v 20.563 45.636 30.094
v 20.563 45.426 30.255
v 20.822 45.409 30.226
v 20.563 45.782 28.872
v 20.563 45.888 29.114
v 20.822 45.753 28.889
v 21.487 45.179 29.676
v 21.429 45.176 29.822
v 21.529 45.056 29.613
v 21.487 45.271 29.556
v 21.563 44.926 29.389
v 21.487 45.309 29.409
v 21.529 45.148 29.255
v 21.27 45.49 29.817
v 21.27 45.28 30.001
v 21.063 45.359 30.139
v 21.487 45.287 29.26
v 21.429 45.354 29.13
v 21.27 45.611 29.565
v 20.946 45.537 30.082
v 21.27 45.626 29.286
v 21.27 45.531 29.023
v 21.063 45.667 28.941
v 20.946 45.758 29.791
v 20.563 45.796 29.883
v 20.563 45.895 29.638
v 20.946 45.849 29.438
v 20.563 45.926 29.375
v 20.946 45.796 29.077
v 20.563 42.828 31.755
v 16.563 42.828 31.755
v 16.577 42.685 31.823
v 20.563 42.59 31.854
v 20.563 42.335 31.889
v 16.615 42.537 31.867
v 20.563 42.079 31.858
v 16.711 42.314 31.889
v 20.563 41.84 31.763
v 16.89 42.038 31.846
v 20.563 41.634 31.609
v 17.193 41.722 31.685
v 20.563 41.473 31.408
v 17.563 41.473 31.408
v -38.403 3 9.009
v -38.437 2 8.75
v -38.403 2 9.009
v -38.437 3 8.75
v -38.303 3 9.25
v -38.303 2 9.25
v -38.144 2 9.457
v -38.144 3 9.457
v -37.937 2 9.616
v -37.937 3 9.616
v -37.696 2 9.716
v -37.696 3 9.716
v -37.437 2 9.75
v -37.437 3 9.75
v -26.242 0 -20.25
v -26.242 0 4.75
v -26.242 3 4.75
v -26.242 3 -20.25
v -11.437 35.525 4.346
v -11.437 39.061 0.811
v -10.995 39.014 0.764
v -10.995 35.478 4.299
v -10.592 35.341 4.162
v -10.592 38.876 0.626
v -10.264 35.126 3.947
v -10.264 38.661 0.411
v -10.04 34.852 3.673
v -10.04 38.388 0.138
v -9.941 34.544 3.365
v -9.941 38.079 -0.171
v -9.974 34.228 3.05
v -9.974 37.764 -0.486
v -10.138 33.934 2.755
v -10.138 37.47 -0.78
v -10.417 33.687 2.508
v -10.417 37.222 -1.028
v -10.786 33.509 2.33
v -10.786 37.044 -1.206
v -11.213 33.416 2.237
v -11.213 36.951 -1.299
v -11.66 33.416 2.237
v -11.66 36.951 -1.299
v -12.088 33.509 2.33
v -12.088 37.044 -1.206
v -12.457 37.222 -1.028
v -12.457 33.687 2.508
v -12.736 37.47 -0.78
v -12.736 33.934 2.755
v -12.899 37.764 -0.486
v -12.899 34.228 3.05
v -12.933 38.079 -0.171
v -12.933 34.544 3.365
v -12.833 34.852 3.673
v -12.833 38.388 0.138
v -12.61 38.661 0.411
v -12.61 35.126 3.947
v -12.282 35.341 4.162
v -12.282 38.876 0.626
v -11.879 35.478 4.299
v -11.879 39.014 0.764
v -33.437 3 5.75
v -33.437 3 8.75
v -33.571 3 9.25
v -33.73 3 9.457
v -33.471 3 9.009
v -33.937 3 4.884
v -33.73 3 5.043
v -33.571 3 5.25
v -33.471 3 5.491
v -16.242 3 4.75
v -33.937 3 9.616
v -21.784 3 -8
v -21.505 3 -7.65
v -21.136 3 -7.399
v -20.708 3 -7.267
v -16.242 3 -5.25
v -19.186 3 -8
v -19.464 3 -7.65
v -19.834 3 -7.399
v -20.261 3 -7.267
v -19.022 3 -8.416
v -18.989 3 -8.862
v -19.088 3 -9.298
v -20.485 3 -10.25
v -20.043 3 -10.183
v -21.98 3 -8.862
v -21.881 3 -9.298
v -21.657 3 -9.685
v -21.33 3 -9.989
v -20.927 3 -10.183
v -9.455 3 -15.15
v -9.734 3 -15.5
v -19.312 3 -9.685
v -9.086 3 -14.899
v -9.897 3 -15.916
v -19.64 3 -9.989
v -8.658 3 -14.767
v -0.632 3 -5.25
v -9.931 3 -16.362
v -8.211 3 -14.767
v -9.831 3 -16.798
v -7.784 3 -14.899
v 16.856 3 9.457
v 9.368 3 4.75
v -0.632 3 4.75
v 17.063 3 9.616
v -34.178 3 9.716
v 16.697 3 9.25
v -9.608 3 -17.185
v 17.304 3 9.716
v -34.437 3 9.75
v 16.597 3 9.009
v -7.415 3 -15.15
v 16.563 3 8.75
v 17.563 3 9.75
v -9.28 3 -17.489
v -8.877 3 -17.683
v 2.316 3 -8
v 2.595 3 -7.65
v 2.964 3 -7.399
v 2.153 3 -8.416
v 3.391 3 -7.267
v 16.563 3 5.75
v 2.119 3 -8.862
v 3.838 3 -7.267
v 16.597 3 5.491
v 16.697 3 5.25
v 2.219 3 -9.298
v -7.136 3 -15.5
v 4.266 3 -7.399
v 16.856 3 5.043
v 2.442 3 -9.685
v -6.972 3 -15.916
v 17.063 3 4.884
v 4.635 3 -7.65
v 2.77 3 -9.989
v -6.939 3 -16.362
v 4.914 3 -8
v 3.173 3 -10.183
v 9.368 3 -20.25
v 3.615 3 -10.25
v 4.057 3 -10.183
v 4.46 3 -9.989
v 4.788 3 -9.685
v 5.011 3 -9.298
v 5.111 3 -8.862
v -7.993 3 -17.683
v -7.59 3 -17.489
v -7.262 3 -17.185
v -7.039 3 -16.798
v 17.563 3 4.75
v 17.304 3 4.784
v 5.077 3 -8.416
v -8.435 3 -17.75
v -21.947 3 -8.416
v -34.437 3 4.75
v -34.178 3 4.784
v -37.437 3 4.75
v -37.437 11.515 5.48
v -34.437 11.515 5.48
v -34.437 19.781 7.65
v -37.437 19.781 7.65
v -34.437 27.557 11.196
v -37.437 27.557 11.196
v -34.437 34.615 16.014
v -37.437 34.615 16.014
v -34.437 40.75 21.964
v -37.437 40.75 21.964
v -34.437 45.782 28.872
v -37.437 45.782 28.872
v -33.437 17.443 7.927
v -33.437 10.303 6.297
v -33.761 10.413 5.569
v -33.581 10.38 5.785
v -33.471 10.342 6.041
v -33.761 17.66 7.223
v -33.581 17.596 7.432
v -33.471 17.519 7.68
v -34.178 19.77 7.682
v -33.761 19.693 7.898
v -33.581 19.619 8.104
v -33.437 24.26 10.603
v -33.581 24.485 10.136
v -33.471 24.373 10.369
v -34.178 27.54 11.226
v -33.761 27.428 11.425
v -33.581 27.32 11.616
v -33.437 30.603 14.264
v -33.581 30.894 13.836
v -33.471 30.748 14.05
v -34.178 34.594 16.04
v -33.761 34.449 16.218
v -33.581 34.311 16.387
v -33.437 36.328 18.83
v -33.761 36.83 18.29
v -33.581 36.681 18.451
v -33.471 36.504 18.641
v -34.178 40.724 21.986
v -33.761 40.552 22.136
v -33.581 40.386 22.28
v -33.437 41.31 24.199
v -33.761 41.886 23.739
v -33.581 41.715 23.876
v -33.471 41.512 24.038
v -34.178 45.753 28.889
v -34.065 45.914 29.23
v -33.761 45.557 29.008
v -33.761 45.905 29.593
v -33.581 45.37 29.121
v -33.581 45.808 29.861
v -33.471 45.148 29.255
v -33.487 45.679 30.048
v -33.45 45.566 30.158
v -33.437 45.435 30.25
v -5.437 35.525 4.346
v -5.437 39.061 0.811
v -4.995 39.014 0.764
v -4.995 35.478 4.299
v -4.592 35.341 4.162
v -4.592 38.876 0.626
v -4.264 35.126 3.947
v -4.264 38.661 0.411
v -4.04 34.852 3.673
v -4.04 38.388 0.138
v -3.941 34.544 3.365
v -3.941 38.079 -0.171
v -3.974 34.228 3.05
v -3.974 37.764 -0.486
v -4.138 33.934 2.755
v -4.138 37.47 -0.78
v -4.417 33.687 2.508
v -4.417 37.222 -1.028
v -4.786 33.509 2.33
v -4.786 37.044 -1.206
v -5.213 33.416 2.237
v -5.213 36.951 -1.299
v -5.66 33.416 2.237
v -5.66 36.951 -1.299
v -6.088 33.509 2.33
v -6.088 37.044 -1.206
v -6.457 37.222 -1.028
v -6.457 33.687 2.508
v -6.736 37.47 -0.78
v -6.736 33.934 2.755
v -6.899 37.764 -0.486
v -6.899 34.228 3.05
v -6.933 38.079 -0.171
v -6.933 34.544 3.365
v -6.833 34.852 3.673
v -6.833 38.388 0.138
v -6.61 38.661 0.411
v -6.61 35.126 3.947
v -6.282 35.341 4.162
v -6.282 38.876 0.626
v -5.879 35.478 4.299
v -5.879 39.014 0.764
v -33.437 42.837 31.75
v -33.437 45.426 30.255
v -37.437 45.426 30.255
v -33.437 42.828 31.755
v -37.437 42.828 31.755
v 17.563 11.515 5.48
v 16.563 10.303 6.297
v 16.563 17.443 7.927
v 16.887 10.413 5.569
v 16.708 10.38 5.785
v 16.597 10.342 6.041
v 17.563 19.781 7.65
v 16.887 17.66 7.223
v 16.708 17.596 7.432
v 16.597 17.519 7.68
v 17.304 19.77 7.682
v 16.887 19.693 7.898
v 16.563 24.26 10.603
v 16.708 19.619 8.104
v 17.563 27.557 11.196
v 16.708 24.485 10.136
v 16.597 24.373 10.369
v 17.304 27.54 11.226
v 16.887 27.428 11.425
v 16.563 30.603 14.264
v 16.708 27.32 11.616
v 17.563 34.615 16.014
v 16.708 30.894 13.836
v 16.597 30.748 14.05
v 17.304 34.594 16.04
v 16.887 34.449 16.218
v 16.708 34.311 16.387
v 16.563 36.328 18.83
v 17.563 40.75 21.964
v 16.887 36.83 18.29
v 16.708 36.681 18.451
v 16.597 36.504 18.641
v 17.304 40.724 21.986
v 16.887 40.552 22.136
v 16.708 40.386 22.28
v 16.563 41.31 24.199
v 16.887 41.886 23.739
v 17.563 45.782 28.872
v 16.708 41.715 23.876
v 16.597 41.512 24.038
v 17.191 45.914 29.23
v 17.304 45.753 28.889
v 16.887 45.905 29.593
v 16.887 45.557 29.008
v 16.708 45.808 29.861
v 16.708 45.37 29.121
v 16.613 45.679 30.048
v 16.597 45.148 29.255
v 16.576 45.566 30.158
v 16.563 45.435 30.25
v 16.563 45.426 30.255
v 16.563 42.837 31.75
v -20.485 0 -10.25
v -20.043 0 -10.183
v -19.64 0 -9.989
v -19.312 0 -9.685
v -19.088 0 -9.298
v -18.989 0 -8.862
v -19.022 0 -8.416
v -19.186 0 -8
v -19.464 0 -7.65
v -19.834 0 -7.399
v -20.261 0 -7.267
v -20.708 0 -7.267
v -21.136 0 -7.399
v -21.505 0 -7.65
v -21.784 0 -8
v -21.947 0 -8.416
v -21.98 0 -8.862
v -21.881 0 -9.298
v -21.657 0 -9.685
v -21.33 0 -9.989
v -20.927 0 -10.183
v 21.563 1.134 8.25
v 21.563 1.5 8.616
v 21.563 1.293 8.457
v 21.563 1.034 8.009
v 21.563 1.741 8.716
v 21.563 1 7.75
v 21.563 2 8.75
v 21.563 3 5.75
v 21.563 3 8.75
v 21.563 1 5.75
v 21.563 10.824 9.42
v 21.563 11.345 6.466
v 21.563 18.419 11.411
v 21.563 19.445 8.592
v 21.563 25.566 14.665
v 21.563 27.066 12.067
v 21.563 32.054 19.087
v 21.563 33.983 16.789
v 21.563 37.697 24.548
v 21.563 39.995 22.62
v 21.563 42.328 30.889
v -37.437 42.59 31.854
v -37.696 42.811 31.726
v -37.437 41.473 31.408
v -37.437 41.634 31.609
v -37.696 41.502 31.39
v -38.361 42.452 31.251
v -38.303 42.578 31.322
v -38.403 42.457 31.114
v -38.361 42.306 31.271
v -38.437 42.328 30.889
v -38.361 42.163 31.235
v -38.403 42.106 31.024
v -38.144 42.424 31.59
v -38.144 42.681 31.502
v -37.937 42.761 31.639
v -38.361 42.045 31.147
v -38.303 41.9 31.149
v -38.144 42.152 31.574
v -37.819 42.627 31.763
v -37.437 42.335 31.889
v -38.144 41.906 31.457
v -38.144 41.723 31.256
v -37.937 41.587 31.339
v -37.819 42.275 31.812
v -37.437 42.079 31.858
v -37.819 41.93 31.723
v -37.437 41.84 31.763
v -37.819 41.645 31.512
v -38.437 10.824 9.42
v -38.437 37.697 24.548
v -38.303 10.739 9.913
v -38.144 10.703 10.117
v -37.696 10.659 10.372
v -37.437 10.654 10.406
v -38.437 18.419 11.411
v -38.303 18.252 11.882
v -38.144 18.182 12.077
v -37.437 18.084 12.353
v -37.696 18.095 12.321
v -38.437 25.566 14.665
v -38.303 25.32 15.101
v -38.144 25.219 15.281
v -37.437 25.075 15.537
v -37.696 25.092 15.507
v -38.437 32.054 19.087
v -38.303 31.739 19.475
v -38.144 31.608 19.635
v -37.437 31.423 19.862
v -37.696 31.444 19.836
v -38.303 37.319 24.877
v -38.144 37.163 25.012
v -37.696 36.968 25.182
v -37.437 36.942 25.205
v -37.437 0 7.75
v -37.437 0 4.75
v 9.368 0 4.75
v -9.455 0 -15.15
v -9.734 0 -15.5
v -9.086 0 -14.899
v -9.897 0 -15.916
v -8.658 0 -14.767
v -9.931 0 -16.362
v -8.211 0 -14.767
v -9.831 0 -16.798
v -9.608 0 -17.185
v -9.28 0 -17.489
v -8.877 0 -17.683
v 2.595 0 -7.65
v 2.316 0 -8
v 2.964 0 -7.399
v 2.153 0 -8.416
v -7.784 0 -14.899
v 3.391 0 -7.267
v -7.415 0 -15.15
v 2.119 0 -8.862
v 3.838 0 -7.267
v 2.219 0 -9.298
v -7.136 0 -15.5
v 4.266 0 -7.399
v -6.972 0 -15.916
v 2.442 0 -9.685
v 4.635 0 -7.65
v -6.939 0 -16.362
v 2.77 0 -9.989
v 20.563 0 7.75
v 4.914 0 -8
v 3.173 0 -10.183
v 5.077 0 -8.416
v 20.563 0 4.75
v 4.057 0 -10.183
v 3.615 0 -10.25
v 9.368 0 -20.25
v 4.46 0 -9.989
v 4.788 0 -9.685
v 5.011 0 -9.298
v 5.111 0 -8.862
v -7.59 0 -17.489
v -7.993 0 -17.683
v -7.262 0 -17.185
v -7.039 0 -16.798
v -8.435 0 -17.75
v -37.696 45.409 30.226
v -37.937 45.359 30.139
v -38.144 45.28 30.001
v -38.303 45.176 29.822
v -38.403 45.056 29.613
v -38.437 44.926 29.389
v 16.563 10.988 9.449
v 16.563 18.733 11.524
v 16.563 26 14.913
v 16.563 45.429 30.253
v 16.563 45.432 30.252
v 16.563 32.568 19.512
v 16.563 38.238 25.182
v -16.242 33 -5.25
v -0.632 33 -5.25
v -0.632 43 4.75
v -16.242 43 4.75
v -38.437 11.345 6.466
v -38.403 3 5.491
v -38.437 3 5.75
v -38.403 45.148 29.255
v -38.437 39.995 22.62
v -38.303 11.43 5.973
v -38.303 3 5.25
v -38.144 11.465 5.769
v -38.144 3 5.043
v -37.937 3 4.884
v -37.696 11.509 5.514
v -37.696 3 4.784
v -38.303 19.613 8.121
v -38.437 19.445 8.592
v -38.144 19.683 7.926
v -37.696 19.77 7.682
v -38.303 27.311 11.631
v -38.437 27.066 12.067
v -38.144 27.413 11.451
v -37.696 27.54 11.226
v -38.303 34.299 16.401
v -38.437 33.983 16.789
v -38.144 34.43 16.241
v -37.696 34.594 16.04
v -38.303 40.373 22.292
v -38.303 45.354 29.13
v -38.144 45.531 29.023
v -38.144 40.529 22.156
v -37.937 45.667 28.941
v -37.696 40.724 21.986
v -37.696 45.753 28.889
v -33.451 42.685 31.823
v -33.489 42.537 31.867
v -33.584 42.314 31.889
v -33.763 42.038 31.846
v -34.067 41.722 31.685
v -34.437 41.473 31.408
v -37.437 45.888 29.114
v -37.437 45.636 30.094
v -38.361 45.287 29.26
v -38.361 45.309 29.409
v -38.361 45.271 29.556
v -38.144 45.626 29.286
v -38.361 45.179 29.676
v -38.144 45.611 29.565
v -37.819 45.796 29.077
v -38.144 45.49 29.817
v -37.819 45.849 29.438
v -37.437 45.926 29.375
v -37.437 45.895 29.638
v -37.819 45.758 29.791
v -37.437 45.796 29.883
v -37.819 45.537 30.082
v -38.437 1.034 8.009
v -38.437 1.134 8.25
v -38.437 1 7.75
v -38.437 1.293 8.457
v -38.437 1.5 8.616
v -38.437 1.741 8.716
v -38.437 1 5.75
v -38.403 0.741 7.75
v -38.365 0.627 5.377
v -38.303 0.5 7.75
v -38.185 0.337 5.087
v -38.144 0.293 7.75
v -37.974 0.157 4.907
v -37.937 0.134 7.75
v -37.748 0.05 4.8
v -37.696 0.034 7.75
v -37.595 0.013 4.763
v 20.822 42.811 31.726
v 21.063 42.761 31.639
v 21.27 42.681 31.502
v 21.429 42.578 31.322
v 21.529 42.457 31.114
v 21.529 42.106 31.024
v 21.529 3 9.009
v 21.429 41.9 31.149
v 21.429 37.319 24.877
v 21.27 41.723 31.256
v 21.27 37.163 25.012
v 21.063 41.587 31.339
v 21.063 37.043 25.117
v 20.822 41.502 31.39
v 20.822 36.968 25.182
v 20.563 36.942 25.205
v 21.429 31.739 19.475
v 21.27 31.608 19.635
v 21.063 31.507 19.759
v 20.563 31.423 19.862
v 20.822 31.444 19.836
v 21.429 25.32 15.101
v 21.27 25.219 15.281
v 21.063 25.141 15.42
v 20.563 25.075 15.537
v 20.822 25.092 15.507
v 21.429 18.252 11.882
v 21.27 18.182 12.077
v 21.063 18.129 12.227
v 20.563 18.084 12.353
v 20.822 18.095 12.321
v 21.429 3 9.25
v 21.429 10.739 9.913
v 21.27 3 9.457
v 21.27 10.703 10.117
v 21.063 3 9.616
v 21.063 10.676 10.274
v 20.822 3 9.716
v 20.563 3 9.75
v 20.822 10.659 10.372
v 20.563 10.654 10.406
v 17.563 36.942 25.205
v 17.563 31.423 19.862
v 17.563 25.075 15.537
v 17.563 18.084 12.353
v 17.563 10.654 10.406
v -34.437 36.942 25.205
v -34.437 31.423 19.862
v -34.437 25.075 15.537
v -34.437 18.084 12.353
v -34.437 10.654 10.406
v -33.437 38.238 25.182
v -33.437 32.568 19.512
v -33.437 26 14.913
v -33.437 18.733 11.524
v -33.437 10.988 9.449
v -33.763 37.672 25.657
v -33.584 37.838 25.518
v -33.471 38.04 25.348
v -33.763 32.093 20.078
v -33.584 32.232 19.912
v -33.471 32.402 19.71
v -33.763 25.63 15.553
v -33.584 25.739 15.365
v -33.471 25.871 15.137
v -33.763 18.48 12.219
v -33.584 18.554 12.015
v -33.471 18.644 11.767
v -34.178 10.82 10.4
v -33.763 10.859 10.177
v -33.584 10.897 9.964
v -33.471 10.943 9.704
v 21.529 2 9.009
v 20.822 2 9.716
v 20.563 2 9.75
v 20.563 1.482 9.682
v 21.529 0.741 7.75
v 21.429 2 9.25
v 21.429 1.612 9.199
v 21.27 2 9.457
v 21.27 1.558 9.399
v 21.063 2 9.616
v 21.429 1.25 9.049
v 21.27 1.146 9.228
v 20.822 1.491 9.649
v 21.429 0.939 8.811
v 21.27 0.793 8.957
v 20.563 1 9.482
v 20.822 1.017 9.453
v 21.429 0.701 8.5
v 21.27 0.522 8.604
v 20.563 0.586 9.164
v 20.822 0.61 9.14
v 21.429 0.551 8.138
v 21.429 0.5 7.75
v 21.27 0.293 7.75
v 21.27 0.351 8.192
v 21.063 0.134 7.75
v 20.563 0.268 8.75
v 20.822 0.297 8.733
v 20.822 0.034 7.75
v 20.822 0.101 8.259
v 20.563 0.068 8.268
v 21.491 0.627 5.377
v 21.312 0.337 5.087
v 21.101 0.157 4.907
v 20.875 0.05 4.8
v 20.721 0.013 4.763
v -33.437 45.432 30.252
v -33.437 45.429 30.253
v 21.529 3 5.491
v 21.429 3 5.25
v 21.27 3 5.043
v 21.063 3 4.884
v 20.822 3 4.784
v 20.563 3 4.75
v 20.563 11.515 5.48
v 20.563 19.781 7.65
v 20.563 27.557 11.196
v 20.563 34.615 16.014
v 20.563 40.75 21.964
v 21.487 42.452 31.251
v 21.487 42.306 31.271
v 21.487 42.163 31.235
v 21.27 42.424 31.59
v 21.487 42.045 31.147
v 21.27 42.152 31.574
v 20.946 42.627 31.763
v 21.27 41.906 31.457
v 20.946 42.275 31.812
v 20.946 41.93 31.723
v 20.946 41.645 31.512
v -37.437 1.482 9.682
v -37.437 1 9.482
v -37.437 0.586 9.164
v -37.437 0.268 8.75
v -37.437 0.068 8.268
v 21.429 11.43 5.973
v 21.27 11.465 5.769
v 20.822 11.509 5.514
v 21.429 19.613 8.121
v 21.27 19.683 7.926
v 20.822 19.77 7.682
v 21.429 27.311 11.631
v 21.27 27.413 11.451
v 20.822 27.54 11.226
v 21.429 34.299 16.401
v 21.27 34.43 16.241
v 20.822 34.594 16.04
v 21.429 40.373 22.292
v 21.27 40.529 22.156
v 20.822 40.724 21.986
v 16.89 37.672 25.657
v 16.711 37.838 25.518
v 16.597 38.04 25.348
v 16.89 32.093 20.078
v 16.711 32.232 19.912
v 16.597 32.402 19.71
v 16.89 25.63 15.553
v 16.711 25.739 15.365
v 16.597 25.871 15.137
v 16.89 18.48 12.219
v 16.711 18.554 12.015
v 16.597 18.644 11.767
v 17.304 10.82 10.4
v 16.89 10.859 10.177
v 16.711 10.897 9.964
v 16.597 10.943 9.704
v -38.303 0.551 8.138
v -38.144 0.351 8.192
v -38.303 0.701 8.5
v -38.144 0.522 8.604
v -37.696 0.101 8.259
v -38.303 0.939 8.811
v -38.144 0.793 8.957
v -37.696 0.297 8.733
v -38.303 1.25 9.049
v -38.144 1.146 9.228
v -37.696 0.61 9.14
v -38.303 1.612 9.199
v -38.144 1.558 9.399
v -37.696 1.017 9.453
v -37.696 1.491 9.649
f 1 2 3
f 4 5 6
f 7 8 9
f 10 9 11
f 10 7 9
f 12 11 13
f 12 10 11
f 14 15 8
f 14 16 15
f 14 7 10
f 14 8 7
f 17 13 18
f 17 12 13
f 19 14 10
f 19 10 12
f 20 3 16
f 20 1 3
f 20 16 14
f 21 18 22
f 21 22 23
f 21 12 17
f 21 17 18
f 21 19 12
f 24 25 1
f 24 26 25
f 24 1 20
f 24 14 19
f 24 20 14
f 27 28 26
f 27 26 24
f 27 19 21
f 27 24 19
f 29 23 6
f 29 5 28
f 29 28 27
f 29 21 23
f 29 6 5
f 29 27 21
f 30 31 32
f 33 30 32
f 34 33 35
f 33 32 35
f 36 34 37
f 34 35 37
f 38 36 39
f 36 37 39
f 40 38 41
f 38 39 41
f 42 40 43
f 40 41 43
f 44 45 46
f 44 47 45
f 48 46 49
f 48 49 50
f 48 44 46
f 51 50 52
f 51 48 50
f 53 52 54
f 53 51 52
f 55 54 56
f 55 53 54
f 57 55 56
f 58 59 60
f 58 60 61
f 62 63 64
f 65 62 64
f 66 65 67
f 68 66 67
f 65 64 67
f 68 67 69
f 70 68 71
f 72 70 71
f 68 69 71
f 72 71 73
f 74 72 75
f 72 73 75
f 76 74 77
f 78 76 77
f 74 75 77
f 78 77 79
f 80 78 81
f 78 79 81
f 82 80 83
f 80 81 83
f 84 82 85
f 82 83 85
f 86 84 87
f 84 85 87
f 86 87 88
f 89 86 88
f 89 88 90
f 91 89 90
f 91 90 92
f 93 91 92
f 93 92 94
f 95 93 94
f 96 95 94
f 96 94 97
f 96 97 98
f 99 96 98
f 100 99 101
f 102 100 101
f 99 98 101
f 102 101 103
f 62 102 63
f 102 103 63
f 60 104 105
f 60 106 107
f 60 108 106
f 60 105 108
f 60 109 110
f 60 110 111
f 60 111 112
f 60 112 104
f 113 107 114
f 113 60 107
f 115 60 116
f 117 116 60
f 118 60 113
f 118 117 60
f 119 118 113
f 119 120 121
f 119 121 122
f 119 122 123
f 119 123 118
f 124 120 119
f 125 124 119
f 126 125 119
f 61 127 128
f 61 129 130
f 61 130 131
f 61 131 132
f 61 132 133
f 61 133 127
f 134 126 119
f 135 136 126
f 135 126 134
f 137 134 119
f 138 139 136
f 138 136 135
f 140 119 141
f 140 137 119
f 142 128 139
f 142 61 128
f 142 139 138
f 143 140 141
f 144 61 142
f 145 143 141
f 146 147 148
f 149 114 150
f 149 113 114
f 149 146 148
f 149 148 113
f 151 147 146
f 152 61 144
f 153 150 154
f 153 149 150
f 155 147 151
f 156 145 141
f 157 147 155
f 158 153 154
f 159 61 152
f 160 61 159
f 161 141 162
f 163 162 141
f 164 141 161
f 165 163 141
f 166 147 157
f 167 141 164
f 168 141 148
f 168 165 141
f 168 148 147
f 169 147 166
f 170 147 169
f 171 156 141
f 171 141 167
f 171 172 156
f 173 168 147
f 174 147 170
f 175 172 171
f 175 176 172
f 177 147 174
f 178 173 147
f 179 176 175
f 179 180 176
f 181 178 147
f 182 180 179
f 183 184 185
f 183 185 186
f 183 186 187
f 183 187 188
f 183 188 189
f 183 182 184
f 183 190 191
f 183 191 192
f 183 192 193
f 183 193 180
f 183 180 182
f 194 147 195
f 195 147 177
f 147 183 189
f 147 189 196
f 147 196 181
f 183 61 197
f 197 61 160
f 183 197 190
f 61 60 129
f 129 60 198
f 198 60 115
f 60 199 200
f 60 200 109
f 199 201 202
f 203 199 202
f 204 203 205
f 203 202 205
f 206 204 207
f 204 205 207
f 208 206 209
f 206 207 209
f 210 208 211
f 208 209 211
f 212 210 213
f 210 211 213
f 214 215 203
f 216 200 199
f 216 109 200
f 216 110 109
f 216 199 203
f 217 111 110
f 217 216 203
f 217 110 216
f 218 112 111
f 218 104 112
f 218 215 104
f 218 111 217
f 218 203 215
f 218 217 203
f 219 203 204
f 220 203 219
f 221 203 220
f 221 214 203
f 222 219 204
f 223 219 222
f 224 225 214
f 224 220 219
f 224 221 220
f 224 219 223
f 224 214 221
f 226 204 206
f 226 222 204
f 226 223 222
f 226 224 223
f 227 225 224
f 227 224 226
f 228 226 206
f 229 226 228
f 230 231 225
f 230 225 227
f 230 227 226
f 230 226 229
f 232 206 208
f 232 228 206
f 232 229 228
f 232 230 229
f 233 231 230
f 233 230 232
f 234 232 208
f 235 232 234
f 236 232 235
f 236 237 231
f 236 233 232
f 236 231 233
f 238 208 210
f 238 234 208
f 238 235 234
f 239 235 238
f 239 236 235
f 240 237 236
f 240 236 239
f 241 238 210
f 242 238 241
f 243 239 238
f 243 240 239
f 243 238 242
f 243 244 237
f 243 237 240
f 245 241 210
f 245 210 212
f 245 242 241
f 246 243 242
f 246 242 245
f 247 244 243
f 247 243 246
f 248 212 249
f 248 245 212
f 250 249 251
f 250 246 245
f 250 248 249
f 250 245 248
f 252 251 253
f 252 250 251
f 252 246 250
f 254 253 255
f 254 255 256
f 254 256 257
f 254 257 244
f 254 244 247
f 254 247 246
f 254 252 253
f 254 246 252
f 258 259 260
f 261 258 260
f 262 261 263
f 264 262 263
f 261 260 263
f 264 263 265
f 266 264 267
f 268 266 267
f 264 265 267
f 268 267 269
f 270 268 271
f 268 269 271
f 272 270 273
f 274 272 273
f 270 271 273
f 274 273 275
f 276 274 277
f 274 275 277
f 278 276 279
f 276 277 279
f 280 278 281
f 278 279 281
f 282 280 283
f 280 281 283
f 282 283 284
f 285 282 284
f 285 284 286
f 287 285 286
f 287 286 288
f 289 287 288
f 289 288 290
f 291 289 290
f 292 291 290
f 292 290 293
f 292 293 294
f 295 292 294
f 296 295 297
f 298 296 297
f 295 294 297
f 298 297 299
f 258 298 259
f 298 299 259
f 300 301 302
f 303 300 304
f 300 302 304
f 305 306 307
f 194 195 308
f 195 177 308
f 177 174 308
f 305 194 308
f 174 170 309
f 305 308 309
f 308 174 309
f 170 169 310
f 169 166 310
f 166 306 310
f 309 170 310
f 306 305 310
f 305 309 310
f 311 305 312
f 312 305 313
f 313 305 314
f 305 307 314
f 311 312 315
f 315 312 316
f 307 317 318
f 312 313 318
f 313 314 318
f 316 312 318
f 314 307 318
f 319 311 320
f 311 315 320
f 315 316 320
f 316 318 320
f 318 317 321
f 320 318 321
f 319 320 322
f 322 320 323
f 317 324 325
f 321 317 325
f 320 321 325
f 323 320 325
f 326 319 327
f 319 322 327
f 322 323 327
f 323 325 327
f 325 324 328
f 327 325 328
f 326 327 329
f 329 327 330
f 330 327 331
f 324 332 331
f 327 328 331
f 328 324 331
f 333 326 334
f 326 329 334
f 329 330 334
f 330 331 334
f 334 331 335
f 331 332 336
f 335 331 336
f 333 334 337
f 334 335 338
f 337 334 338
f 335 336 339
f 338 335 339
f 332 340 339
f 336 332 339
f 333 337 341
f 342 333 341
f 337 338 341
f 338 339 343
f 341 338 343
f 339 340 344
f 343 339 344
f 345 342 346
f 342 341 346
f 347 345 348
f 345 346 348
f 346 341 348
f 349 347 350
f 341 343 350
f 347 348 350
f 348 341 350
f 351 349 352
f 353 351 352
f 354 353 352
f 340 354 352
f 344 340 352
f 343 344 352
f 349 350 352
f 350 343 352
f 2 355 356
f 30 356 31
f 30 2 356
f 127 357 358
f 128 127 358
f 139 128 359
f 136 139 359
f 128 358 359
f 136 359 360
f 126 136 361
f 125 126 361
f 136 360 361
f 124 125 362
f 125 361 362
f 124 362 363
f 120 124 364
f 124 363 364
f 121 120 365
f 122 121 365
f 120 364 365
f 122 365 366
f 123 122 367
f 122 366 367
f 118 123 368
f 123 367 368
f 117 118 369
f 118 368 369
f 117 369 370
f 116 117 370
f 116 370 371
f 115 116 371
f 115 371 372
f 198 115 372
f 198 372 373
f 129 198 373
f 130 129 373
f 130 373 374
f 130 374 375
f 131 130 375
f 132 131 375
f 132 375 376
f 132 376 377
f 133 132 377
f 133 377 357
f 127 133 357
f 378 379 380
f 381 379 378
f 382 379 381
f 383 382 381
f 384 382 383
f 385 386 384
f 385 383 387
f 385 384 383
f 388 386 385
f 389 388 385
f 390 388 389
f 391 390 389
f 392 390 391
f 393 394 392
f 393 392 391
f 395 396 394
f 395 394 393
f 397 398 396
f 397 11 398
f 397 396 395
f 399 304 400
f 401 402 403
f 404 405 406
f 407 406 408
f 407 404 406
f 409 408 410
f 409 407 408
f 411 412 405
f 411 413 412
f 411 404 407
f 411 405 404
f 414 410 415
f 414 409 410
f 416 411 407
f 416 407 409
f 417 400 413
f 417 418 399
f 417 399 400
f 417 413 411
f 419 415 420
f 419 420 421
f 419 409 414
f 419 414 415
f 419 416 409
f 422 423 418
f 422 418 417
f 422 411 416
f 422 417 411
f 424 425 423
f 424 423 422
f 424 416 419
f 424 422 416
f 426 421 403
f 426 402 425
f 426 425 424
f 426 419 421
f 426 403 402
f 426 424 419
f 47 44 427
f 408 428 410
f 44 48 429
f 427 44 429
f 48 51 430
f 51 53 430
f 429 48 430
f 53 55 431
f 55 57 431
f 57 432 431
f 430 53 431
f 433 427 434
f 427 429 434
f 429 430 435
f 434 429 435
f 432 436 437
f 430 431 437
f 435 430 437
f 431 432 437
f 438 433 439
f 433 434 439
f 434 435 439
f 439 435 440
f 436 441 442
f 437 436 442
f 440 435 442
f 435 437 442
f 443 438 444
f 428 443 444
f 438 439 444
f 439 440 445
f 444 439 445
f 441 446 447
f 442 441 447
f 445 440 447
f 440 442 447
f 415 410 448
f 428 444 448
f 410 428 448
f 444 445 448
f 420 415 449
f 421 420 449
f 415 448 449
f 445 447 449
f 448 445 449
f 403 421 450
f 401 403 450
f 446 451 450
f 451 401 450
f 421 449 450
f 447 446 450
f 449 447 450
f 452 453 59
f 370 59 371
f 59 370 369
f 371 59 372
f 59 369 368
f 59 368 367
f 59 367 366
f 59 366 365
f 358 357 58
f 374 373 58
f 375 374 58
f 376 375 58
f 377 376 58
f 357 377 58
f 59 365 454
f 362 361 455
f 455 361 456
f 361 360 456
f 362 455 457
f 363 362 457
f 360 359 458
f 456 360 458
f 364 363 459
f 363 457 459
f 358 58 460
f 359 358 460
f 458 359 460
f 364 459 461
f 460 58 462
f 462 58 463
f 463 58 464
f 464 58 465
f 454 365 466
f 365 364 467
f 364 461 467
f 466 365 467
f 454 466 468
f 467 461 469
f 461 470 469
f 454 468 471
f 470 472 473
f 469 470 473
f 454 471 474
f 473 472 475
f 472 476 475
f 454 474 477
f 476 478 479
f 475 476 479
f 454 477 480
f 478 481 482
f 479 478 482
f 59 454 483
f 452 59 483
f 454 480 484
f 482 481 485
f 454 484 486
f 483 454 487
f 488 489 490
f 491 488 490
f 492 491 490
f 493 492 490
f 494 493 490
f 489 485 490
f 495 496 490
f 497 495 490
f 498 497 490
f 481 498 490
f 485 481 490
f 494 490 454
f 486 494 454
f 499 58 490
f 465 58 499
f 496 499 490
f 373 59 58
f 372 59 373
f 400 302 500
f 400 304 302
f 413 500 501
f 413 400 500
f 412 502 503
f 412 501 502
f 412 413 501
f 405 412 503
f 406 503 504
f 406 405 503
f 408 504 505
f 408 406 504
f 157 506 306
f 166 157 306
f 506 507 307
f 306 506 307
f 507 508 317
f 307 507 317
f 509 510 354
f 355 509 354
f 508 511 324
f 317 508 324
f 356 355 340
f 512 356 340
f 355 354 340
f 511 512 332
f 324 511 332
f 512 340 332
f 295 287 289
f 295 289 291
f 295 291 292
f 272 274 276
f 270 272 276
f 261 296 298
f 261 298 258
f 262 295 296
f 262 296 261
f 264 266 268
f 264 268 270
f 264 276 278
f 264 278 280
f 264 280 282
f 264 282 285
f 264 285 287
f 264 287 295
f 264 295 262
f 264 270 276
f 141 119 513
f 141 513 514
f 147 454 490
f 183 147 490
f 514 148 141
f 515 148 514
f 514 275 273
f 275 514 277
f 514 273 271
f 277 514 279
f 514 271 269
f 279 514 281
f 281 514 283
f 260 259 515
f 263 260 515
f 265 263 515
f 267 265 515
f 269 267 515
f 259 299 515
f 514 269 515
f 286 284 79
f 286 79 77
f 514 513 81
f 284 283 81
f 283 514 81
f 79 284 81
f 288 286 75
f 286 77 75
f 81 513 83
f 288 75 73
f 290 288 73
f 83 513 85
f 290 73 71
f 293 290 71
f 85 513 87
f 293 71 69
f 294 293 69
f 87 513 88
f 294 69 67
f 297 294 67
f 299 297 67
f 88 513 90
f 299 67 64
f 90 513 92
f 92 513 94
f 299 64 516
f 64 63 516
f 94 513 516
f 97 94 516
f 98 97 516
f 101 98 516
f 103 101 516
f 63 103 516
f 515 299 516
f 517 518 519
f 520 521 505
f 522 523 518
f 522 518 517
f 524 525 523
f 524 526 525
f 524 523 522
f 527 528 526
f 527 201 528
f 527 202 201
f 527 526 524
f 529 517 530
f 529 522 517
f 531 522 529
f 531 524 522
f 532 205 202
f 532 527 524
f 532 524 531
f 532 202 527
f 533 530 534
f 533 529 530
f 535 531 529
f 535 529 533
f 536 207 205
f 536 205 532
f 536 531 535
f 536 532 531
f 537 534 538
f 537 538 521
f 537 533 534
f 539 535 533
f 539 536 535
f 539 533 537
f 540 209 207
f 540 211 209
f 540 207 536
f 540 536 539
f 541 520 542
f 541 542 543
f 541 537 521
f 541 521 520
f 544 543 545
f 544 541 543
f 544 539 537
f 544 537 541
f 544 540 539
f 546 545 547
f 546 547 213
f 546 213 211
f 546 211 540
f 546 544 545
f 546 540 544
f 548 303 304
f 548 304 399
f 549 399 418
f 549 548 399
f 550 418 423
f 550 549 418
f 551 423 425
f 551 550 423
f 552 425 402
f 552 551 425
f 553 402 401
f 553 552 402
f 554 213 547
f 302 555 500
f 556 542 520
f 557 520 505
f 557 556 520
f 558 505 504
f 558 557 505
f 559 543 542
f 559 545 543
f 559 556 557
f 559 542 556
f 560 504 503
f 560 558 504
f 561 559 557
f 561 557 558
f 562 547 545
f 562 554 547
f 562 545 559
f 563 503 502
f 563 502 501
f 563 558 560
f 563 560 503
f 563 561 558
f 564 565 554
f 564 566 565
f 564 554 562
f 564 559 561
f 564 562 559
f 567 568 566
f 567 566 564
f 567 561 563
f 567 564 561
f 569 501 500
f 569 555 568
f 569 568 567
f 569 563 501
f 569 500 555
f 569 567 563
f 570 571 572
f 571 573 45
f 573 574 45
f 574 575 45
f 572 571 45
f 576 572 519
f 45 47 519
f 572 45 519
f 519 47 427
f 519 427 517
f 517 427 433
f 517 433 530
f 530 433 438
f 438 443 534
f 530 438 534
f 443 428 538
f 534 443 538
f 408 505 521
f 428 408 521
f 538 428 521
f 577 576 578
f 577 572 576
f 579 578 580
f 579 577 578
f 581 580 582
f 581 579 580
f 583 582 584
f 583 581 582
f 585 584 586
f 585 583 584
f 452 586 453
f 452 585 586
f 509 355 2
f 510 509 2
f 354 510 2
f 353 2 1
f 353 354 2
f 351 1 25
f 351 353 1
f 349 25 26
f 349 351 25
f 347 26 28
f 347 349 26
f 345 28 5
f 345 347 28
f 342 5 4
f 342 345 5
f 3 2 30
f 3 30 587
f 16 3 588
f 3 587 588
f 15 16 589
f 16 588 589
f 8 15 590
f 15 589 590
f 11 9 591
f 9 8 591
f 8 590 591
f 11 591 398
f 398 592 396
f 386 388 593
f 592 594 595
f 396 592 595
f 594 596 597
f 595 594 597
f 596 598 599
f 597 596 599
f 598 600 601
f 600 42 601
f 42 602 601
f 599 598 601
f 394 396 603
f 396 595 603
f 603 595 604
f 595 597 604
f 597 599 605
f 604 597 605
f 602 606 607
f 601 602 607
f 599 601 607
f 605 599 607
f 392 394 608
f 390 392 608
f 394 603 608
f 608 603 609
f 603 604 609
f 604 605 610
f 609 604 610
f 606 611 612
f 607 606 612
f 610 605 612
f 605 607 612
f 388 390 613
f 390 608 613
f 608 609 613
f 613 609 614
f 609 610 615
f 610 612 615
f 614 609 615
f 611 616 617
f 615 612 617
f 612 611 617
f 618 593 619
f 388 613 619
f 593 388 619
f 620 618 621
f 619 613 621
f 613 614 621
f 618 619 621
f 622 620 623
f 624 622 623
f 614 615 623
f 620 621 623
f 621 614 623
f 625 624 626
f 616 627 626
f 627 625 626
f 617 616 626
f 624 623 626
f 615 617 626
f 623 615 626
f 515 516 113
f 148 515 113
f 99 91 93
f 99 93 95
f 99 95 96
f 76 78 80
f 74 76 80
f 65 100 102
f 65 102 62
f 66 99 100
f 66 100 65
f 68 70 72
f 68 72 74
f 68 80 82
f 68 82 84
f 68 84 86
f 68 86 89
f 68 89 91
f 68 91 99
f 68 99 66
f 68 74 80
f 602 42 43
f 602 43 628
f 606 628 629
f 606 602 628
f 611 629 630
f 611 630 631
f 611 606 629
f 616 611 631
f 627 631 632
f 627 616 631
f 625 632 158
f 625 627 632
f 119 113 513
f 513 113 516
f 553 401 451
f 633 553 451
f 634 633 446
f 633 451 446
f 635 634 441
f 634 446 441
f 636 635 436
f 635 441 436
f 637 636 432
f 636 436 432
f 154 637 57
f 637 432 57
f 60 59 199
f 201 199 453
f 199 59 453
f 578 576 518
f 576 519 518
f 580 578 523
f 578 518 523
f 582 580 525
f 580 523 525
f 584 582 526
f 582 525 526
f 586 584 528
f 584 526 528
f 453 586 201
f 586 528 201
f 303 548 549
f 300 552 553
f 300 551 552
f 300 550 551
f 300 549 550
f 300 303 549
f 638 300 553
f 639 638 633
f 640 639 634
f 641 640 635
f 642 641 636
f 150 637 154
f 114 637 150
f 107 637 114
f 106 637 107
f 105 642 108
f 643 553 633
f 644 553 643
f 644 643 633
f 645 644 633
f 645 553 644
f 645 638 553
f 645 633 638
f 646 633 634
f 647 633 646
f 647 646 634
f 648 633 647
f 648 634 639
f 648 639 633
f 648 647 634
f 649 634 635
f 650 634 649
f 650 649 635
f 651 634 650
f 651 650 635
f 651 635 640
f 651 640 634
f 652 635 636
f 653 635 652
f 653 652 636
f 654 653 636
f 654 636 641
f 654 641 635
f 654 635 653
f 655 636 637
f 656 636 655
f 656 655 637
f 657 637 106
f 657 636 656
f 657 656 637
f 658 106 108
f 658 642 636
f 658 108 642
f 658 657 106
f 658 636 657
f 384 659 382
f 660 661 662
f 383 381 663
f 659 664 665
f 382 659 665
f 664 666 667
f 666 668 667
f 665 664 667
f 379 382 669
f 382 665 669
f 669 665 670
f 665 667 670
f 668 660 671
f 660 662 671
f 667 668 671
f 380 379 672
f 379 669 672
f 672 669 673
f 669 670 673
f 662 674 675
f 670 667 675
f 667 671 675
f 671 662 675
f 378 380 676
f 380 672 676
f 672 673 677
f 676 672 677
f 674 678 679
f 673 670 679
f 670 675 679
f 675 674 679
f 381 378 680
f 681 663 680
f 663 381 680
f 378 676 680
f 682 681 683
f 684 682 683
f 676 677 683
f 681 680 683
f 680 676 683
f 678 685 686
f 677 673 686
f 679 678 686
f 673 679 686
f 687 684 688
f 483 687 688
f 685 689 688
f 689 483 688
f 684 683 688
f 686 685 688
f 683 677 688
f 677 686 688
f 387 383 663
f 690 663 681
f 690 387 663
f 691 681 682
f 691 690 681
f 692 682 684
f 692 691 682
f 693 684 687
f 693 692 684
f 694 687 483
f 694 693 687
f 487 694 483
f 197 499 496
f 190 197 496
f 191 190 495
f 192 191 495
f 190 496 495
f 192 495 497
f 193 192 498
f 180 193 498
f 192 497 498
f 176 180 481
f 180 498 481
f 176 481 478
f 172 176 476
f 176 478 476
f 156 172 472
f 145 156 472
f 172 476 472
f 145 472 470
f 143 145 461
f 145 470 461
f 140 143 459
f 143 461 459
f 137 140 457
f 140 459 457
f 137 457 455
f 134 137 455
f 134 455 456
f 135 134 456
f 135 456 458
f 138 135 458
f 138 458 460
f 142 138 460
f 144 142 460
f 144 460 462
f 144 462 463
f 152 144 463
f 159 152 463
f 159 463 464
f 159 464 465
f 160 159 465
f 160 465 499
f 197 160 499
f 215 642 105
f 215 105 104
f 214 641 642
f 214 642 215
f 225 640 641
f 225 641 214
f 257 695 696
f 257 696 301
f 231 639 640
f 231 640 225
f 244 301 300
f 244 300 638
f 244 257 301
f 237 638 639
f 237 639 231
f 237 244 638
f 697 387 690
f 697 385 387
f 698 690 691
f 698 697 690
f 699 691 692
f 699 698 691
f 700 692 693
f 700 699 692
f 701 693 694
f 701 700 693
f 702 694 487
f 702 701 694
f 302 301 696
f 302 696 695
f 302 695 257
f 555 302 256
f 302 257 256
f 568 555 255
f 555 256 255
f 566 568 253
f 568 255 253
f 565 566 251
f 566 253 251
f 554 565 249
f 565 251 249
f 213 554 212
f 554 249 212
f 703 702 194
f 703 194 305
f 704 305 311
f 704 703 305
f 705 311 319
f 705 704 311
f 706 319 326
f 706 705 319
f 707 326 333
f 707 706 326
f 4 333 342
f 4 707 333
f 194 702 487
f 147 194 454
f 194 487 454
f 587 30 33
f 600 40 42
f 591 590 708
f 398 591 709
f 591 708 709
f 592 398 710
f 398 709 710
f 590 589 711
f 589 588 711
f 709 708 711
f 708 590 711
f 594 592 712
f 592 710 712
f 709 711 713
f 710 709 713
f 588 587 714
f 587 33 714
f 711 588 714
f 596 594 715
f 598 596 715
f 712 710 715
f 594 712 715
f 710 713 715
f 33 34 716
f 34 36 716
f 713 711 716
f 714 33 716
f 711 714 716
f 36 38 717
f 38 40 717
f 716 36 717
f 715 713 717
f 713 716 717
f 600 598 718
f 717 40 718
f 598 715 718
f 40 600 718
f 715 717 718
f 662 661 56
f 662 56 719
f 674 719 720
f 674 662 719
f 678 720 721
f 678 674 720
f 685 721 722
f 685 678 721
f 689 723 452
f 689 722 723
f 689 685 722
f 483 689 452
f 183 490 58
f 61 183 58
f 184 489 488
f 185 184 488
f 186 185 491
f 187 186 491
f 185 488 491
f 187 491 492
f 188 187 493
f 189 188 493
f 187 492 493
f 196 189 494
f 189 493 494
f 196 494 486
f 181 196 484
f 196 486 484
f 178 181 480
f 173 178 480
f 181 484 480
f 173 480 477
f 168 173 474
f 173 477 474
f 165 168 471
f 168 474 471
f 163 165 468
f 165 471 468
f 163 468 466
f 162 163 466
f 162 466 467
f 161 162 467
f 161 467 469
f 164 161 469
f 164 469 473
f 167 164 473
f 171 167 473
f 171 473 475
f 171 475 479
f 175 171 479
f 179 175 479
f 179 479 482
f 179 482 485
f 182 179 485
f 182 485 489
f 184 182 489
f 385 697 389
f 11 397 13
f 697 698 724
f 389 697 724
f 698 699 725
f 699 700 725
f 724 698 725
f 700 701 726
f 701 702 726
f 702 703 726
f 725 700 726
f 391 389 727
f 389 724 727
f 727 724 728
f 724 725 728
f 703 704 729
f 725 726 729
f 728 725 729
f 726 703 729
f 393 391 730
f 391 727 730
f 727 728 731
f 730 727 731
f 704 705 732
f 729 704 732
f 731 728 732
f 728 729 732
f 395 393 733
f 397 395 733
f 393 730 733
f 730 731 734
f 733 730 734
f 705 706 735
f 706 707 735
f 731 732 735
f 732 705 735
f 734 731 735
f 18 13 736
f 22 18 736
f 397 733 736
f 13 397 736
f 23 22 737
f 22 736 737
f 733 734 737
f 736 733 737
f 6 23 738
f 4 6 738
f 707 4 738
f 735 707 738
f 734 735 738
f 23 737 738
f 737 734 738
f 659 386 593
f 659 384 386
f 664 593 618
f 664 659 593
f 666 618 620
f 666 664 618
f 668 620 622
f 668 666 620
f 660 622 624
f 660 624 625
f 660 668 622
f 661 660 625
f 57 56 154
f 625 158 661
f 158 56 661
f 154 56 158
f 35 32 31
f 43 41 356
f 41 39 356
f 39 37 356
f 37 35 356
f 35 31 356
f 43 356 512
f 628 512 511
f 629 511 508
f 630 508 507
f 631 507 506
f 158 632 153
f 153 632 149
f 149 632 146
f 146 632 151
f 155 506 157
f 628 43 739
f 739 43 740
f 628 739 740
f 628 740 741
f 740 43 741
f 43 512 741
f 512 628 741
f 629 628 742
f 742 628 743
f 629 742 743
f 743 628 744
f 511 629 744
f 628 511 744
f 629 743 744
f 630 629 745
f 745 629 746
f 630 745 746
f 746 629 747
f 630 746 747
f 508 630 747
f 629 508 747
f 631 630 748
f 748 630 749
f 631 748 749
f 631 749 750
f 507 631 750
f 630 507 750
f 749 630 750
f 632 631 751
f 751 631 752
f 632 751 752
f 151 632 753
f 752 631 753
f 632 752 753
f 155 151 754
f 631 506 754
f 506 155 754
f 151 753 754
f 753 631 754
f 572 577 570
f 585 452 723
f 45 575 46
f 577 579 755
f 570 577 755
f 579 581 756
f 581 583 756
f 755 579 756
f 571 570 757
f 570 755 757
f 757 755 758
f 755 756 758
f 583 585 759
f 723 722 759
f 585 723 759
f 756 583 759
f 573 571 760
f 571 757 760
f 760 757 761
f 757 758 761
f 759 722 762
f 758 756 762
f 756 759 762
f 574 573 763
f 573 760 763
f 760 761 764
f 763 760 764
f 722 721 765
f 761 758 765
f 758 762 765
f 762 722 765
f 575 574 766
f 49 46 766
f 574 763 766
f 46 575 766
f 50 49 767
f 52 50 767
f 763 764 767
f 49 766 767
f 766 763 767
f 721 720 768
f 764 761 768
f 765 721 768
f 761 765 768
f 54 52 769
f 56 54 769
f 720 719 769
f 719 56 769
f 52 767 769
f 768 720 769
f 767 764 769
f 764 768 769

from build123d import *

# Parameters (mm, degrees)
SKETCH1_W           = 17.805
SKETCH1_H           = 25
BOSS_EXTRUDE1_DEPTH = 3
FILLET1_R           = 2
BOSS_EXTRUDE3_DEPTH = 5
FILLET2_R           = 1
FILLET3_R           = 1
SKETCH3_R           = 1.5
CUT_EXTRUDE1_DEPTH  = 5
SKETCH7_W           = 15.61
SKETCH7_H           = 10
BOSS_EXTRUDE4_DEPTH = 30
BOSS_EXTRUDE5_DEPTH = 15.61
SKETCH9_R           = 1.5
CUT_EXTRUDE2_DEPTH  = 5


with BuildPart() as part:
    # Sketch1 → Boss-Extrude1 (new body)
    with BuildSketch(Plane(origin=(0, 0, 0), x_dir=(1, 0, 0), z_dir=(0, 1, 0))):
        Polygon((9.368218391, -4.75), (-8.436781609, -4.75), (-26.241781609, -4.75), (-38.436781609, -4.75), (-38.436781609, -9.75), (21.563218391, -9.75), (21.563218391, -4.75), align=None)
        with Locations((0.465718391, 7.75)):
            Rectangle(SKETCH1_W, SKETCH1_H)
        with Locations((-17.339281609, 7.75)):
            Rectangle(SKETCH1_W, SKETCH1_H)
    extrude(amount=BOSS_EXTRUDE1_DEPTH)

    # Fillet1
    fillet1_edges = [part.edges().sort_by_distance(p)[0] for p in [
        (-8.436781609, 0, 9.75),
    ]]
    fillet(fillet1_edges, radius=FILLET1_R)

    # Sketch2 → Boss-Extrude3 (add)
    with BuildSketch(Plane(origin=(21.563218391, 0, 0), x_dir=(0, 0, -1), z_dir=(1, 0, 0))):
        with BuildLine():
            Line((-29.75, 46.301270189), (-32.25, 41.97114317))
            ThreePointArc((-32.25, 41.97114317), (-15.77885683, 25.5), (-9.75, 3))
            Line((-9.75, 3), (-4.75, 3))
            ThreePointArc((-4.75, 3), (-11.448729811, 28), (-29.75, 46.301270189))
        make_face()
    boss_extrude3 = extrude(amount=-BOSS_EXTRUDE3_DEPTH)

    # Fillet2
    fillet2_edges = [part.edges().sort_by_distance(p)[0] for p in [
        (21.563218391, 0, 6.25),
        (21.563218391, 2.5, 9.75),
        (21.563218391, 1.5, 4.75),
        (21.563218391, 0.585786438, 9.164213562),
        (16.563218391, 25.5, 15.77885683),
        (19.063218391, 41.97114317, 32.25),
        (16.563218391, 28, 11.448729811),
        (19.063218391, 46.301270189, 29.75),
        (21.563218391, 25.5, 15.77885683),
        (21.563218391, 28, 11.448729811),
        (21.563218391, 44.13620668, 31),
    ]]
    fillet(fillet2_edges, radius=FILLET2_R)

    # Mirror3: Boss-Extrude3 across plane
    add(boss_extrude3.mirror(Plane(origin=(-8.436781609, 0, 0), x_dir=(0, 0, 1), z_dir=(1, 0, 0))))

    # Fillet3
    fillet3_edges = [part.edges().sort_by_distance(p)[0] for p in [
        (-38.436781609, 0, 6.25),
        (-38.436781609, 2.5, 9.75),
        (-38.436781609, 1.5, 4.75),
        (-38.436781609, 0.585786438, 9.164213562),
        (-38.436781609, 25.5, 15.77885683),
        (-35.936781609, 41.97114317, 32.25),
        (-38.436781609, 28, 11.448729811),
        (-38.436781609, 44.13620668, 31),
        (-35.936781609, 46.301270189, 29.75),
        (-33.436781609, 25.5, 15.77885683),
        (-33.436781609, 28, 11.448729811),
    ]]
    fillet(fillet3_edges, radius=FILLET3_R)

    # Sketch3 → Cut-Extrude1 (cut)
    with BuildSketch(Plane.XZ):
        with Locations(Location((-20.484687418, -8.75, 0), (0, 0, 270))):
            Circle(SKETCH3_R)
        with Locations(Location((-8.434877213, -16.25, 0), (0, 0, 270))):
            Circle(SKETCH3_R)
        with Locations(Location((3.614932992, -8.75, 0), (0, 0, 270))):
            Circle(SKETCH3_R)
    extrude(amount=-CUT_EXTRUDE1_DEPTH, mode=Mode.SUBTRACT)

    # Sketch7 → Boss-Extrude4 (add)
    with BuildSketch(Plane(origin=(0, 3, 0), x_dir=(1, 0, 0), z_dir=(0, 1, 0))):
        with Locations((-8.436781609, 0.25)):
            Rectangle(SKETCH7_W, SKETCH7_H)
    extrude(amount=BOSS_EXTRUDE4_DEPTH)

    # Sketch8 → Boss-Extrude5 (add)
    with BuildSketch(Plane.ZY.offset(16.241781609)):
        Polygon((-5.25, 33), (4.75, 43), (4.75, 33), align=None)
    extrude(amount=-BOSS_EXTRUDE5_DEPTH)

    # Sketch9 → Cut-Extrude2 (cut)
    with BuildSketch(Plane(origin=(0, 19.125, -19.125), x_dir=(1, 0, 0), z_dir=(0, 0.7071067811865461, -0.7071067811865489))):
        with Locations(Location((-11.436781609, -26.69328099, 0), (0, 0, 270))):
            Circle(SKETCH9_R)
        with Locations(Location((-5.436781609, -26.69328099, 0), (0, 0, 270))):
            Circle(SKETCH9_R)
    extrude(amount=-CUT_EXTRUDE2_DEPTH, mode=Mode.SUBTRACT)


solid = part.part
